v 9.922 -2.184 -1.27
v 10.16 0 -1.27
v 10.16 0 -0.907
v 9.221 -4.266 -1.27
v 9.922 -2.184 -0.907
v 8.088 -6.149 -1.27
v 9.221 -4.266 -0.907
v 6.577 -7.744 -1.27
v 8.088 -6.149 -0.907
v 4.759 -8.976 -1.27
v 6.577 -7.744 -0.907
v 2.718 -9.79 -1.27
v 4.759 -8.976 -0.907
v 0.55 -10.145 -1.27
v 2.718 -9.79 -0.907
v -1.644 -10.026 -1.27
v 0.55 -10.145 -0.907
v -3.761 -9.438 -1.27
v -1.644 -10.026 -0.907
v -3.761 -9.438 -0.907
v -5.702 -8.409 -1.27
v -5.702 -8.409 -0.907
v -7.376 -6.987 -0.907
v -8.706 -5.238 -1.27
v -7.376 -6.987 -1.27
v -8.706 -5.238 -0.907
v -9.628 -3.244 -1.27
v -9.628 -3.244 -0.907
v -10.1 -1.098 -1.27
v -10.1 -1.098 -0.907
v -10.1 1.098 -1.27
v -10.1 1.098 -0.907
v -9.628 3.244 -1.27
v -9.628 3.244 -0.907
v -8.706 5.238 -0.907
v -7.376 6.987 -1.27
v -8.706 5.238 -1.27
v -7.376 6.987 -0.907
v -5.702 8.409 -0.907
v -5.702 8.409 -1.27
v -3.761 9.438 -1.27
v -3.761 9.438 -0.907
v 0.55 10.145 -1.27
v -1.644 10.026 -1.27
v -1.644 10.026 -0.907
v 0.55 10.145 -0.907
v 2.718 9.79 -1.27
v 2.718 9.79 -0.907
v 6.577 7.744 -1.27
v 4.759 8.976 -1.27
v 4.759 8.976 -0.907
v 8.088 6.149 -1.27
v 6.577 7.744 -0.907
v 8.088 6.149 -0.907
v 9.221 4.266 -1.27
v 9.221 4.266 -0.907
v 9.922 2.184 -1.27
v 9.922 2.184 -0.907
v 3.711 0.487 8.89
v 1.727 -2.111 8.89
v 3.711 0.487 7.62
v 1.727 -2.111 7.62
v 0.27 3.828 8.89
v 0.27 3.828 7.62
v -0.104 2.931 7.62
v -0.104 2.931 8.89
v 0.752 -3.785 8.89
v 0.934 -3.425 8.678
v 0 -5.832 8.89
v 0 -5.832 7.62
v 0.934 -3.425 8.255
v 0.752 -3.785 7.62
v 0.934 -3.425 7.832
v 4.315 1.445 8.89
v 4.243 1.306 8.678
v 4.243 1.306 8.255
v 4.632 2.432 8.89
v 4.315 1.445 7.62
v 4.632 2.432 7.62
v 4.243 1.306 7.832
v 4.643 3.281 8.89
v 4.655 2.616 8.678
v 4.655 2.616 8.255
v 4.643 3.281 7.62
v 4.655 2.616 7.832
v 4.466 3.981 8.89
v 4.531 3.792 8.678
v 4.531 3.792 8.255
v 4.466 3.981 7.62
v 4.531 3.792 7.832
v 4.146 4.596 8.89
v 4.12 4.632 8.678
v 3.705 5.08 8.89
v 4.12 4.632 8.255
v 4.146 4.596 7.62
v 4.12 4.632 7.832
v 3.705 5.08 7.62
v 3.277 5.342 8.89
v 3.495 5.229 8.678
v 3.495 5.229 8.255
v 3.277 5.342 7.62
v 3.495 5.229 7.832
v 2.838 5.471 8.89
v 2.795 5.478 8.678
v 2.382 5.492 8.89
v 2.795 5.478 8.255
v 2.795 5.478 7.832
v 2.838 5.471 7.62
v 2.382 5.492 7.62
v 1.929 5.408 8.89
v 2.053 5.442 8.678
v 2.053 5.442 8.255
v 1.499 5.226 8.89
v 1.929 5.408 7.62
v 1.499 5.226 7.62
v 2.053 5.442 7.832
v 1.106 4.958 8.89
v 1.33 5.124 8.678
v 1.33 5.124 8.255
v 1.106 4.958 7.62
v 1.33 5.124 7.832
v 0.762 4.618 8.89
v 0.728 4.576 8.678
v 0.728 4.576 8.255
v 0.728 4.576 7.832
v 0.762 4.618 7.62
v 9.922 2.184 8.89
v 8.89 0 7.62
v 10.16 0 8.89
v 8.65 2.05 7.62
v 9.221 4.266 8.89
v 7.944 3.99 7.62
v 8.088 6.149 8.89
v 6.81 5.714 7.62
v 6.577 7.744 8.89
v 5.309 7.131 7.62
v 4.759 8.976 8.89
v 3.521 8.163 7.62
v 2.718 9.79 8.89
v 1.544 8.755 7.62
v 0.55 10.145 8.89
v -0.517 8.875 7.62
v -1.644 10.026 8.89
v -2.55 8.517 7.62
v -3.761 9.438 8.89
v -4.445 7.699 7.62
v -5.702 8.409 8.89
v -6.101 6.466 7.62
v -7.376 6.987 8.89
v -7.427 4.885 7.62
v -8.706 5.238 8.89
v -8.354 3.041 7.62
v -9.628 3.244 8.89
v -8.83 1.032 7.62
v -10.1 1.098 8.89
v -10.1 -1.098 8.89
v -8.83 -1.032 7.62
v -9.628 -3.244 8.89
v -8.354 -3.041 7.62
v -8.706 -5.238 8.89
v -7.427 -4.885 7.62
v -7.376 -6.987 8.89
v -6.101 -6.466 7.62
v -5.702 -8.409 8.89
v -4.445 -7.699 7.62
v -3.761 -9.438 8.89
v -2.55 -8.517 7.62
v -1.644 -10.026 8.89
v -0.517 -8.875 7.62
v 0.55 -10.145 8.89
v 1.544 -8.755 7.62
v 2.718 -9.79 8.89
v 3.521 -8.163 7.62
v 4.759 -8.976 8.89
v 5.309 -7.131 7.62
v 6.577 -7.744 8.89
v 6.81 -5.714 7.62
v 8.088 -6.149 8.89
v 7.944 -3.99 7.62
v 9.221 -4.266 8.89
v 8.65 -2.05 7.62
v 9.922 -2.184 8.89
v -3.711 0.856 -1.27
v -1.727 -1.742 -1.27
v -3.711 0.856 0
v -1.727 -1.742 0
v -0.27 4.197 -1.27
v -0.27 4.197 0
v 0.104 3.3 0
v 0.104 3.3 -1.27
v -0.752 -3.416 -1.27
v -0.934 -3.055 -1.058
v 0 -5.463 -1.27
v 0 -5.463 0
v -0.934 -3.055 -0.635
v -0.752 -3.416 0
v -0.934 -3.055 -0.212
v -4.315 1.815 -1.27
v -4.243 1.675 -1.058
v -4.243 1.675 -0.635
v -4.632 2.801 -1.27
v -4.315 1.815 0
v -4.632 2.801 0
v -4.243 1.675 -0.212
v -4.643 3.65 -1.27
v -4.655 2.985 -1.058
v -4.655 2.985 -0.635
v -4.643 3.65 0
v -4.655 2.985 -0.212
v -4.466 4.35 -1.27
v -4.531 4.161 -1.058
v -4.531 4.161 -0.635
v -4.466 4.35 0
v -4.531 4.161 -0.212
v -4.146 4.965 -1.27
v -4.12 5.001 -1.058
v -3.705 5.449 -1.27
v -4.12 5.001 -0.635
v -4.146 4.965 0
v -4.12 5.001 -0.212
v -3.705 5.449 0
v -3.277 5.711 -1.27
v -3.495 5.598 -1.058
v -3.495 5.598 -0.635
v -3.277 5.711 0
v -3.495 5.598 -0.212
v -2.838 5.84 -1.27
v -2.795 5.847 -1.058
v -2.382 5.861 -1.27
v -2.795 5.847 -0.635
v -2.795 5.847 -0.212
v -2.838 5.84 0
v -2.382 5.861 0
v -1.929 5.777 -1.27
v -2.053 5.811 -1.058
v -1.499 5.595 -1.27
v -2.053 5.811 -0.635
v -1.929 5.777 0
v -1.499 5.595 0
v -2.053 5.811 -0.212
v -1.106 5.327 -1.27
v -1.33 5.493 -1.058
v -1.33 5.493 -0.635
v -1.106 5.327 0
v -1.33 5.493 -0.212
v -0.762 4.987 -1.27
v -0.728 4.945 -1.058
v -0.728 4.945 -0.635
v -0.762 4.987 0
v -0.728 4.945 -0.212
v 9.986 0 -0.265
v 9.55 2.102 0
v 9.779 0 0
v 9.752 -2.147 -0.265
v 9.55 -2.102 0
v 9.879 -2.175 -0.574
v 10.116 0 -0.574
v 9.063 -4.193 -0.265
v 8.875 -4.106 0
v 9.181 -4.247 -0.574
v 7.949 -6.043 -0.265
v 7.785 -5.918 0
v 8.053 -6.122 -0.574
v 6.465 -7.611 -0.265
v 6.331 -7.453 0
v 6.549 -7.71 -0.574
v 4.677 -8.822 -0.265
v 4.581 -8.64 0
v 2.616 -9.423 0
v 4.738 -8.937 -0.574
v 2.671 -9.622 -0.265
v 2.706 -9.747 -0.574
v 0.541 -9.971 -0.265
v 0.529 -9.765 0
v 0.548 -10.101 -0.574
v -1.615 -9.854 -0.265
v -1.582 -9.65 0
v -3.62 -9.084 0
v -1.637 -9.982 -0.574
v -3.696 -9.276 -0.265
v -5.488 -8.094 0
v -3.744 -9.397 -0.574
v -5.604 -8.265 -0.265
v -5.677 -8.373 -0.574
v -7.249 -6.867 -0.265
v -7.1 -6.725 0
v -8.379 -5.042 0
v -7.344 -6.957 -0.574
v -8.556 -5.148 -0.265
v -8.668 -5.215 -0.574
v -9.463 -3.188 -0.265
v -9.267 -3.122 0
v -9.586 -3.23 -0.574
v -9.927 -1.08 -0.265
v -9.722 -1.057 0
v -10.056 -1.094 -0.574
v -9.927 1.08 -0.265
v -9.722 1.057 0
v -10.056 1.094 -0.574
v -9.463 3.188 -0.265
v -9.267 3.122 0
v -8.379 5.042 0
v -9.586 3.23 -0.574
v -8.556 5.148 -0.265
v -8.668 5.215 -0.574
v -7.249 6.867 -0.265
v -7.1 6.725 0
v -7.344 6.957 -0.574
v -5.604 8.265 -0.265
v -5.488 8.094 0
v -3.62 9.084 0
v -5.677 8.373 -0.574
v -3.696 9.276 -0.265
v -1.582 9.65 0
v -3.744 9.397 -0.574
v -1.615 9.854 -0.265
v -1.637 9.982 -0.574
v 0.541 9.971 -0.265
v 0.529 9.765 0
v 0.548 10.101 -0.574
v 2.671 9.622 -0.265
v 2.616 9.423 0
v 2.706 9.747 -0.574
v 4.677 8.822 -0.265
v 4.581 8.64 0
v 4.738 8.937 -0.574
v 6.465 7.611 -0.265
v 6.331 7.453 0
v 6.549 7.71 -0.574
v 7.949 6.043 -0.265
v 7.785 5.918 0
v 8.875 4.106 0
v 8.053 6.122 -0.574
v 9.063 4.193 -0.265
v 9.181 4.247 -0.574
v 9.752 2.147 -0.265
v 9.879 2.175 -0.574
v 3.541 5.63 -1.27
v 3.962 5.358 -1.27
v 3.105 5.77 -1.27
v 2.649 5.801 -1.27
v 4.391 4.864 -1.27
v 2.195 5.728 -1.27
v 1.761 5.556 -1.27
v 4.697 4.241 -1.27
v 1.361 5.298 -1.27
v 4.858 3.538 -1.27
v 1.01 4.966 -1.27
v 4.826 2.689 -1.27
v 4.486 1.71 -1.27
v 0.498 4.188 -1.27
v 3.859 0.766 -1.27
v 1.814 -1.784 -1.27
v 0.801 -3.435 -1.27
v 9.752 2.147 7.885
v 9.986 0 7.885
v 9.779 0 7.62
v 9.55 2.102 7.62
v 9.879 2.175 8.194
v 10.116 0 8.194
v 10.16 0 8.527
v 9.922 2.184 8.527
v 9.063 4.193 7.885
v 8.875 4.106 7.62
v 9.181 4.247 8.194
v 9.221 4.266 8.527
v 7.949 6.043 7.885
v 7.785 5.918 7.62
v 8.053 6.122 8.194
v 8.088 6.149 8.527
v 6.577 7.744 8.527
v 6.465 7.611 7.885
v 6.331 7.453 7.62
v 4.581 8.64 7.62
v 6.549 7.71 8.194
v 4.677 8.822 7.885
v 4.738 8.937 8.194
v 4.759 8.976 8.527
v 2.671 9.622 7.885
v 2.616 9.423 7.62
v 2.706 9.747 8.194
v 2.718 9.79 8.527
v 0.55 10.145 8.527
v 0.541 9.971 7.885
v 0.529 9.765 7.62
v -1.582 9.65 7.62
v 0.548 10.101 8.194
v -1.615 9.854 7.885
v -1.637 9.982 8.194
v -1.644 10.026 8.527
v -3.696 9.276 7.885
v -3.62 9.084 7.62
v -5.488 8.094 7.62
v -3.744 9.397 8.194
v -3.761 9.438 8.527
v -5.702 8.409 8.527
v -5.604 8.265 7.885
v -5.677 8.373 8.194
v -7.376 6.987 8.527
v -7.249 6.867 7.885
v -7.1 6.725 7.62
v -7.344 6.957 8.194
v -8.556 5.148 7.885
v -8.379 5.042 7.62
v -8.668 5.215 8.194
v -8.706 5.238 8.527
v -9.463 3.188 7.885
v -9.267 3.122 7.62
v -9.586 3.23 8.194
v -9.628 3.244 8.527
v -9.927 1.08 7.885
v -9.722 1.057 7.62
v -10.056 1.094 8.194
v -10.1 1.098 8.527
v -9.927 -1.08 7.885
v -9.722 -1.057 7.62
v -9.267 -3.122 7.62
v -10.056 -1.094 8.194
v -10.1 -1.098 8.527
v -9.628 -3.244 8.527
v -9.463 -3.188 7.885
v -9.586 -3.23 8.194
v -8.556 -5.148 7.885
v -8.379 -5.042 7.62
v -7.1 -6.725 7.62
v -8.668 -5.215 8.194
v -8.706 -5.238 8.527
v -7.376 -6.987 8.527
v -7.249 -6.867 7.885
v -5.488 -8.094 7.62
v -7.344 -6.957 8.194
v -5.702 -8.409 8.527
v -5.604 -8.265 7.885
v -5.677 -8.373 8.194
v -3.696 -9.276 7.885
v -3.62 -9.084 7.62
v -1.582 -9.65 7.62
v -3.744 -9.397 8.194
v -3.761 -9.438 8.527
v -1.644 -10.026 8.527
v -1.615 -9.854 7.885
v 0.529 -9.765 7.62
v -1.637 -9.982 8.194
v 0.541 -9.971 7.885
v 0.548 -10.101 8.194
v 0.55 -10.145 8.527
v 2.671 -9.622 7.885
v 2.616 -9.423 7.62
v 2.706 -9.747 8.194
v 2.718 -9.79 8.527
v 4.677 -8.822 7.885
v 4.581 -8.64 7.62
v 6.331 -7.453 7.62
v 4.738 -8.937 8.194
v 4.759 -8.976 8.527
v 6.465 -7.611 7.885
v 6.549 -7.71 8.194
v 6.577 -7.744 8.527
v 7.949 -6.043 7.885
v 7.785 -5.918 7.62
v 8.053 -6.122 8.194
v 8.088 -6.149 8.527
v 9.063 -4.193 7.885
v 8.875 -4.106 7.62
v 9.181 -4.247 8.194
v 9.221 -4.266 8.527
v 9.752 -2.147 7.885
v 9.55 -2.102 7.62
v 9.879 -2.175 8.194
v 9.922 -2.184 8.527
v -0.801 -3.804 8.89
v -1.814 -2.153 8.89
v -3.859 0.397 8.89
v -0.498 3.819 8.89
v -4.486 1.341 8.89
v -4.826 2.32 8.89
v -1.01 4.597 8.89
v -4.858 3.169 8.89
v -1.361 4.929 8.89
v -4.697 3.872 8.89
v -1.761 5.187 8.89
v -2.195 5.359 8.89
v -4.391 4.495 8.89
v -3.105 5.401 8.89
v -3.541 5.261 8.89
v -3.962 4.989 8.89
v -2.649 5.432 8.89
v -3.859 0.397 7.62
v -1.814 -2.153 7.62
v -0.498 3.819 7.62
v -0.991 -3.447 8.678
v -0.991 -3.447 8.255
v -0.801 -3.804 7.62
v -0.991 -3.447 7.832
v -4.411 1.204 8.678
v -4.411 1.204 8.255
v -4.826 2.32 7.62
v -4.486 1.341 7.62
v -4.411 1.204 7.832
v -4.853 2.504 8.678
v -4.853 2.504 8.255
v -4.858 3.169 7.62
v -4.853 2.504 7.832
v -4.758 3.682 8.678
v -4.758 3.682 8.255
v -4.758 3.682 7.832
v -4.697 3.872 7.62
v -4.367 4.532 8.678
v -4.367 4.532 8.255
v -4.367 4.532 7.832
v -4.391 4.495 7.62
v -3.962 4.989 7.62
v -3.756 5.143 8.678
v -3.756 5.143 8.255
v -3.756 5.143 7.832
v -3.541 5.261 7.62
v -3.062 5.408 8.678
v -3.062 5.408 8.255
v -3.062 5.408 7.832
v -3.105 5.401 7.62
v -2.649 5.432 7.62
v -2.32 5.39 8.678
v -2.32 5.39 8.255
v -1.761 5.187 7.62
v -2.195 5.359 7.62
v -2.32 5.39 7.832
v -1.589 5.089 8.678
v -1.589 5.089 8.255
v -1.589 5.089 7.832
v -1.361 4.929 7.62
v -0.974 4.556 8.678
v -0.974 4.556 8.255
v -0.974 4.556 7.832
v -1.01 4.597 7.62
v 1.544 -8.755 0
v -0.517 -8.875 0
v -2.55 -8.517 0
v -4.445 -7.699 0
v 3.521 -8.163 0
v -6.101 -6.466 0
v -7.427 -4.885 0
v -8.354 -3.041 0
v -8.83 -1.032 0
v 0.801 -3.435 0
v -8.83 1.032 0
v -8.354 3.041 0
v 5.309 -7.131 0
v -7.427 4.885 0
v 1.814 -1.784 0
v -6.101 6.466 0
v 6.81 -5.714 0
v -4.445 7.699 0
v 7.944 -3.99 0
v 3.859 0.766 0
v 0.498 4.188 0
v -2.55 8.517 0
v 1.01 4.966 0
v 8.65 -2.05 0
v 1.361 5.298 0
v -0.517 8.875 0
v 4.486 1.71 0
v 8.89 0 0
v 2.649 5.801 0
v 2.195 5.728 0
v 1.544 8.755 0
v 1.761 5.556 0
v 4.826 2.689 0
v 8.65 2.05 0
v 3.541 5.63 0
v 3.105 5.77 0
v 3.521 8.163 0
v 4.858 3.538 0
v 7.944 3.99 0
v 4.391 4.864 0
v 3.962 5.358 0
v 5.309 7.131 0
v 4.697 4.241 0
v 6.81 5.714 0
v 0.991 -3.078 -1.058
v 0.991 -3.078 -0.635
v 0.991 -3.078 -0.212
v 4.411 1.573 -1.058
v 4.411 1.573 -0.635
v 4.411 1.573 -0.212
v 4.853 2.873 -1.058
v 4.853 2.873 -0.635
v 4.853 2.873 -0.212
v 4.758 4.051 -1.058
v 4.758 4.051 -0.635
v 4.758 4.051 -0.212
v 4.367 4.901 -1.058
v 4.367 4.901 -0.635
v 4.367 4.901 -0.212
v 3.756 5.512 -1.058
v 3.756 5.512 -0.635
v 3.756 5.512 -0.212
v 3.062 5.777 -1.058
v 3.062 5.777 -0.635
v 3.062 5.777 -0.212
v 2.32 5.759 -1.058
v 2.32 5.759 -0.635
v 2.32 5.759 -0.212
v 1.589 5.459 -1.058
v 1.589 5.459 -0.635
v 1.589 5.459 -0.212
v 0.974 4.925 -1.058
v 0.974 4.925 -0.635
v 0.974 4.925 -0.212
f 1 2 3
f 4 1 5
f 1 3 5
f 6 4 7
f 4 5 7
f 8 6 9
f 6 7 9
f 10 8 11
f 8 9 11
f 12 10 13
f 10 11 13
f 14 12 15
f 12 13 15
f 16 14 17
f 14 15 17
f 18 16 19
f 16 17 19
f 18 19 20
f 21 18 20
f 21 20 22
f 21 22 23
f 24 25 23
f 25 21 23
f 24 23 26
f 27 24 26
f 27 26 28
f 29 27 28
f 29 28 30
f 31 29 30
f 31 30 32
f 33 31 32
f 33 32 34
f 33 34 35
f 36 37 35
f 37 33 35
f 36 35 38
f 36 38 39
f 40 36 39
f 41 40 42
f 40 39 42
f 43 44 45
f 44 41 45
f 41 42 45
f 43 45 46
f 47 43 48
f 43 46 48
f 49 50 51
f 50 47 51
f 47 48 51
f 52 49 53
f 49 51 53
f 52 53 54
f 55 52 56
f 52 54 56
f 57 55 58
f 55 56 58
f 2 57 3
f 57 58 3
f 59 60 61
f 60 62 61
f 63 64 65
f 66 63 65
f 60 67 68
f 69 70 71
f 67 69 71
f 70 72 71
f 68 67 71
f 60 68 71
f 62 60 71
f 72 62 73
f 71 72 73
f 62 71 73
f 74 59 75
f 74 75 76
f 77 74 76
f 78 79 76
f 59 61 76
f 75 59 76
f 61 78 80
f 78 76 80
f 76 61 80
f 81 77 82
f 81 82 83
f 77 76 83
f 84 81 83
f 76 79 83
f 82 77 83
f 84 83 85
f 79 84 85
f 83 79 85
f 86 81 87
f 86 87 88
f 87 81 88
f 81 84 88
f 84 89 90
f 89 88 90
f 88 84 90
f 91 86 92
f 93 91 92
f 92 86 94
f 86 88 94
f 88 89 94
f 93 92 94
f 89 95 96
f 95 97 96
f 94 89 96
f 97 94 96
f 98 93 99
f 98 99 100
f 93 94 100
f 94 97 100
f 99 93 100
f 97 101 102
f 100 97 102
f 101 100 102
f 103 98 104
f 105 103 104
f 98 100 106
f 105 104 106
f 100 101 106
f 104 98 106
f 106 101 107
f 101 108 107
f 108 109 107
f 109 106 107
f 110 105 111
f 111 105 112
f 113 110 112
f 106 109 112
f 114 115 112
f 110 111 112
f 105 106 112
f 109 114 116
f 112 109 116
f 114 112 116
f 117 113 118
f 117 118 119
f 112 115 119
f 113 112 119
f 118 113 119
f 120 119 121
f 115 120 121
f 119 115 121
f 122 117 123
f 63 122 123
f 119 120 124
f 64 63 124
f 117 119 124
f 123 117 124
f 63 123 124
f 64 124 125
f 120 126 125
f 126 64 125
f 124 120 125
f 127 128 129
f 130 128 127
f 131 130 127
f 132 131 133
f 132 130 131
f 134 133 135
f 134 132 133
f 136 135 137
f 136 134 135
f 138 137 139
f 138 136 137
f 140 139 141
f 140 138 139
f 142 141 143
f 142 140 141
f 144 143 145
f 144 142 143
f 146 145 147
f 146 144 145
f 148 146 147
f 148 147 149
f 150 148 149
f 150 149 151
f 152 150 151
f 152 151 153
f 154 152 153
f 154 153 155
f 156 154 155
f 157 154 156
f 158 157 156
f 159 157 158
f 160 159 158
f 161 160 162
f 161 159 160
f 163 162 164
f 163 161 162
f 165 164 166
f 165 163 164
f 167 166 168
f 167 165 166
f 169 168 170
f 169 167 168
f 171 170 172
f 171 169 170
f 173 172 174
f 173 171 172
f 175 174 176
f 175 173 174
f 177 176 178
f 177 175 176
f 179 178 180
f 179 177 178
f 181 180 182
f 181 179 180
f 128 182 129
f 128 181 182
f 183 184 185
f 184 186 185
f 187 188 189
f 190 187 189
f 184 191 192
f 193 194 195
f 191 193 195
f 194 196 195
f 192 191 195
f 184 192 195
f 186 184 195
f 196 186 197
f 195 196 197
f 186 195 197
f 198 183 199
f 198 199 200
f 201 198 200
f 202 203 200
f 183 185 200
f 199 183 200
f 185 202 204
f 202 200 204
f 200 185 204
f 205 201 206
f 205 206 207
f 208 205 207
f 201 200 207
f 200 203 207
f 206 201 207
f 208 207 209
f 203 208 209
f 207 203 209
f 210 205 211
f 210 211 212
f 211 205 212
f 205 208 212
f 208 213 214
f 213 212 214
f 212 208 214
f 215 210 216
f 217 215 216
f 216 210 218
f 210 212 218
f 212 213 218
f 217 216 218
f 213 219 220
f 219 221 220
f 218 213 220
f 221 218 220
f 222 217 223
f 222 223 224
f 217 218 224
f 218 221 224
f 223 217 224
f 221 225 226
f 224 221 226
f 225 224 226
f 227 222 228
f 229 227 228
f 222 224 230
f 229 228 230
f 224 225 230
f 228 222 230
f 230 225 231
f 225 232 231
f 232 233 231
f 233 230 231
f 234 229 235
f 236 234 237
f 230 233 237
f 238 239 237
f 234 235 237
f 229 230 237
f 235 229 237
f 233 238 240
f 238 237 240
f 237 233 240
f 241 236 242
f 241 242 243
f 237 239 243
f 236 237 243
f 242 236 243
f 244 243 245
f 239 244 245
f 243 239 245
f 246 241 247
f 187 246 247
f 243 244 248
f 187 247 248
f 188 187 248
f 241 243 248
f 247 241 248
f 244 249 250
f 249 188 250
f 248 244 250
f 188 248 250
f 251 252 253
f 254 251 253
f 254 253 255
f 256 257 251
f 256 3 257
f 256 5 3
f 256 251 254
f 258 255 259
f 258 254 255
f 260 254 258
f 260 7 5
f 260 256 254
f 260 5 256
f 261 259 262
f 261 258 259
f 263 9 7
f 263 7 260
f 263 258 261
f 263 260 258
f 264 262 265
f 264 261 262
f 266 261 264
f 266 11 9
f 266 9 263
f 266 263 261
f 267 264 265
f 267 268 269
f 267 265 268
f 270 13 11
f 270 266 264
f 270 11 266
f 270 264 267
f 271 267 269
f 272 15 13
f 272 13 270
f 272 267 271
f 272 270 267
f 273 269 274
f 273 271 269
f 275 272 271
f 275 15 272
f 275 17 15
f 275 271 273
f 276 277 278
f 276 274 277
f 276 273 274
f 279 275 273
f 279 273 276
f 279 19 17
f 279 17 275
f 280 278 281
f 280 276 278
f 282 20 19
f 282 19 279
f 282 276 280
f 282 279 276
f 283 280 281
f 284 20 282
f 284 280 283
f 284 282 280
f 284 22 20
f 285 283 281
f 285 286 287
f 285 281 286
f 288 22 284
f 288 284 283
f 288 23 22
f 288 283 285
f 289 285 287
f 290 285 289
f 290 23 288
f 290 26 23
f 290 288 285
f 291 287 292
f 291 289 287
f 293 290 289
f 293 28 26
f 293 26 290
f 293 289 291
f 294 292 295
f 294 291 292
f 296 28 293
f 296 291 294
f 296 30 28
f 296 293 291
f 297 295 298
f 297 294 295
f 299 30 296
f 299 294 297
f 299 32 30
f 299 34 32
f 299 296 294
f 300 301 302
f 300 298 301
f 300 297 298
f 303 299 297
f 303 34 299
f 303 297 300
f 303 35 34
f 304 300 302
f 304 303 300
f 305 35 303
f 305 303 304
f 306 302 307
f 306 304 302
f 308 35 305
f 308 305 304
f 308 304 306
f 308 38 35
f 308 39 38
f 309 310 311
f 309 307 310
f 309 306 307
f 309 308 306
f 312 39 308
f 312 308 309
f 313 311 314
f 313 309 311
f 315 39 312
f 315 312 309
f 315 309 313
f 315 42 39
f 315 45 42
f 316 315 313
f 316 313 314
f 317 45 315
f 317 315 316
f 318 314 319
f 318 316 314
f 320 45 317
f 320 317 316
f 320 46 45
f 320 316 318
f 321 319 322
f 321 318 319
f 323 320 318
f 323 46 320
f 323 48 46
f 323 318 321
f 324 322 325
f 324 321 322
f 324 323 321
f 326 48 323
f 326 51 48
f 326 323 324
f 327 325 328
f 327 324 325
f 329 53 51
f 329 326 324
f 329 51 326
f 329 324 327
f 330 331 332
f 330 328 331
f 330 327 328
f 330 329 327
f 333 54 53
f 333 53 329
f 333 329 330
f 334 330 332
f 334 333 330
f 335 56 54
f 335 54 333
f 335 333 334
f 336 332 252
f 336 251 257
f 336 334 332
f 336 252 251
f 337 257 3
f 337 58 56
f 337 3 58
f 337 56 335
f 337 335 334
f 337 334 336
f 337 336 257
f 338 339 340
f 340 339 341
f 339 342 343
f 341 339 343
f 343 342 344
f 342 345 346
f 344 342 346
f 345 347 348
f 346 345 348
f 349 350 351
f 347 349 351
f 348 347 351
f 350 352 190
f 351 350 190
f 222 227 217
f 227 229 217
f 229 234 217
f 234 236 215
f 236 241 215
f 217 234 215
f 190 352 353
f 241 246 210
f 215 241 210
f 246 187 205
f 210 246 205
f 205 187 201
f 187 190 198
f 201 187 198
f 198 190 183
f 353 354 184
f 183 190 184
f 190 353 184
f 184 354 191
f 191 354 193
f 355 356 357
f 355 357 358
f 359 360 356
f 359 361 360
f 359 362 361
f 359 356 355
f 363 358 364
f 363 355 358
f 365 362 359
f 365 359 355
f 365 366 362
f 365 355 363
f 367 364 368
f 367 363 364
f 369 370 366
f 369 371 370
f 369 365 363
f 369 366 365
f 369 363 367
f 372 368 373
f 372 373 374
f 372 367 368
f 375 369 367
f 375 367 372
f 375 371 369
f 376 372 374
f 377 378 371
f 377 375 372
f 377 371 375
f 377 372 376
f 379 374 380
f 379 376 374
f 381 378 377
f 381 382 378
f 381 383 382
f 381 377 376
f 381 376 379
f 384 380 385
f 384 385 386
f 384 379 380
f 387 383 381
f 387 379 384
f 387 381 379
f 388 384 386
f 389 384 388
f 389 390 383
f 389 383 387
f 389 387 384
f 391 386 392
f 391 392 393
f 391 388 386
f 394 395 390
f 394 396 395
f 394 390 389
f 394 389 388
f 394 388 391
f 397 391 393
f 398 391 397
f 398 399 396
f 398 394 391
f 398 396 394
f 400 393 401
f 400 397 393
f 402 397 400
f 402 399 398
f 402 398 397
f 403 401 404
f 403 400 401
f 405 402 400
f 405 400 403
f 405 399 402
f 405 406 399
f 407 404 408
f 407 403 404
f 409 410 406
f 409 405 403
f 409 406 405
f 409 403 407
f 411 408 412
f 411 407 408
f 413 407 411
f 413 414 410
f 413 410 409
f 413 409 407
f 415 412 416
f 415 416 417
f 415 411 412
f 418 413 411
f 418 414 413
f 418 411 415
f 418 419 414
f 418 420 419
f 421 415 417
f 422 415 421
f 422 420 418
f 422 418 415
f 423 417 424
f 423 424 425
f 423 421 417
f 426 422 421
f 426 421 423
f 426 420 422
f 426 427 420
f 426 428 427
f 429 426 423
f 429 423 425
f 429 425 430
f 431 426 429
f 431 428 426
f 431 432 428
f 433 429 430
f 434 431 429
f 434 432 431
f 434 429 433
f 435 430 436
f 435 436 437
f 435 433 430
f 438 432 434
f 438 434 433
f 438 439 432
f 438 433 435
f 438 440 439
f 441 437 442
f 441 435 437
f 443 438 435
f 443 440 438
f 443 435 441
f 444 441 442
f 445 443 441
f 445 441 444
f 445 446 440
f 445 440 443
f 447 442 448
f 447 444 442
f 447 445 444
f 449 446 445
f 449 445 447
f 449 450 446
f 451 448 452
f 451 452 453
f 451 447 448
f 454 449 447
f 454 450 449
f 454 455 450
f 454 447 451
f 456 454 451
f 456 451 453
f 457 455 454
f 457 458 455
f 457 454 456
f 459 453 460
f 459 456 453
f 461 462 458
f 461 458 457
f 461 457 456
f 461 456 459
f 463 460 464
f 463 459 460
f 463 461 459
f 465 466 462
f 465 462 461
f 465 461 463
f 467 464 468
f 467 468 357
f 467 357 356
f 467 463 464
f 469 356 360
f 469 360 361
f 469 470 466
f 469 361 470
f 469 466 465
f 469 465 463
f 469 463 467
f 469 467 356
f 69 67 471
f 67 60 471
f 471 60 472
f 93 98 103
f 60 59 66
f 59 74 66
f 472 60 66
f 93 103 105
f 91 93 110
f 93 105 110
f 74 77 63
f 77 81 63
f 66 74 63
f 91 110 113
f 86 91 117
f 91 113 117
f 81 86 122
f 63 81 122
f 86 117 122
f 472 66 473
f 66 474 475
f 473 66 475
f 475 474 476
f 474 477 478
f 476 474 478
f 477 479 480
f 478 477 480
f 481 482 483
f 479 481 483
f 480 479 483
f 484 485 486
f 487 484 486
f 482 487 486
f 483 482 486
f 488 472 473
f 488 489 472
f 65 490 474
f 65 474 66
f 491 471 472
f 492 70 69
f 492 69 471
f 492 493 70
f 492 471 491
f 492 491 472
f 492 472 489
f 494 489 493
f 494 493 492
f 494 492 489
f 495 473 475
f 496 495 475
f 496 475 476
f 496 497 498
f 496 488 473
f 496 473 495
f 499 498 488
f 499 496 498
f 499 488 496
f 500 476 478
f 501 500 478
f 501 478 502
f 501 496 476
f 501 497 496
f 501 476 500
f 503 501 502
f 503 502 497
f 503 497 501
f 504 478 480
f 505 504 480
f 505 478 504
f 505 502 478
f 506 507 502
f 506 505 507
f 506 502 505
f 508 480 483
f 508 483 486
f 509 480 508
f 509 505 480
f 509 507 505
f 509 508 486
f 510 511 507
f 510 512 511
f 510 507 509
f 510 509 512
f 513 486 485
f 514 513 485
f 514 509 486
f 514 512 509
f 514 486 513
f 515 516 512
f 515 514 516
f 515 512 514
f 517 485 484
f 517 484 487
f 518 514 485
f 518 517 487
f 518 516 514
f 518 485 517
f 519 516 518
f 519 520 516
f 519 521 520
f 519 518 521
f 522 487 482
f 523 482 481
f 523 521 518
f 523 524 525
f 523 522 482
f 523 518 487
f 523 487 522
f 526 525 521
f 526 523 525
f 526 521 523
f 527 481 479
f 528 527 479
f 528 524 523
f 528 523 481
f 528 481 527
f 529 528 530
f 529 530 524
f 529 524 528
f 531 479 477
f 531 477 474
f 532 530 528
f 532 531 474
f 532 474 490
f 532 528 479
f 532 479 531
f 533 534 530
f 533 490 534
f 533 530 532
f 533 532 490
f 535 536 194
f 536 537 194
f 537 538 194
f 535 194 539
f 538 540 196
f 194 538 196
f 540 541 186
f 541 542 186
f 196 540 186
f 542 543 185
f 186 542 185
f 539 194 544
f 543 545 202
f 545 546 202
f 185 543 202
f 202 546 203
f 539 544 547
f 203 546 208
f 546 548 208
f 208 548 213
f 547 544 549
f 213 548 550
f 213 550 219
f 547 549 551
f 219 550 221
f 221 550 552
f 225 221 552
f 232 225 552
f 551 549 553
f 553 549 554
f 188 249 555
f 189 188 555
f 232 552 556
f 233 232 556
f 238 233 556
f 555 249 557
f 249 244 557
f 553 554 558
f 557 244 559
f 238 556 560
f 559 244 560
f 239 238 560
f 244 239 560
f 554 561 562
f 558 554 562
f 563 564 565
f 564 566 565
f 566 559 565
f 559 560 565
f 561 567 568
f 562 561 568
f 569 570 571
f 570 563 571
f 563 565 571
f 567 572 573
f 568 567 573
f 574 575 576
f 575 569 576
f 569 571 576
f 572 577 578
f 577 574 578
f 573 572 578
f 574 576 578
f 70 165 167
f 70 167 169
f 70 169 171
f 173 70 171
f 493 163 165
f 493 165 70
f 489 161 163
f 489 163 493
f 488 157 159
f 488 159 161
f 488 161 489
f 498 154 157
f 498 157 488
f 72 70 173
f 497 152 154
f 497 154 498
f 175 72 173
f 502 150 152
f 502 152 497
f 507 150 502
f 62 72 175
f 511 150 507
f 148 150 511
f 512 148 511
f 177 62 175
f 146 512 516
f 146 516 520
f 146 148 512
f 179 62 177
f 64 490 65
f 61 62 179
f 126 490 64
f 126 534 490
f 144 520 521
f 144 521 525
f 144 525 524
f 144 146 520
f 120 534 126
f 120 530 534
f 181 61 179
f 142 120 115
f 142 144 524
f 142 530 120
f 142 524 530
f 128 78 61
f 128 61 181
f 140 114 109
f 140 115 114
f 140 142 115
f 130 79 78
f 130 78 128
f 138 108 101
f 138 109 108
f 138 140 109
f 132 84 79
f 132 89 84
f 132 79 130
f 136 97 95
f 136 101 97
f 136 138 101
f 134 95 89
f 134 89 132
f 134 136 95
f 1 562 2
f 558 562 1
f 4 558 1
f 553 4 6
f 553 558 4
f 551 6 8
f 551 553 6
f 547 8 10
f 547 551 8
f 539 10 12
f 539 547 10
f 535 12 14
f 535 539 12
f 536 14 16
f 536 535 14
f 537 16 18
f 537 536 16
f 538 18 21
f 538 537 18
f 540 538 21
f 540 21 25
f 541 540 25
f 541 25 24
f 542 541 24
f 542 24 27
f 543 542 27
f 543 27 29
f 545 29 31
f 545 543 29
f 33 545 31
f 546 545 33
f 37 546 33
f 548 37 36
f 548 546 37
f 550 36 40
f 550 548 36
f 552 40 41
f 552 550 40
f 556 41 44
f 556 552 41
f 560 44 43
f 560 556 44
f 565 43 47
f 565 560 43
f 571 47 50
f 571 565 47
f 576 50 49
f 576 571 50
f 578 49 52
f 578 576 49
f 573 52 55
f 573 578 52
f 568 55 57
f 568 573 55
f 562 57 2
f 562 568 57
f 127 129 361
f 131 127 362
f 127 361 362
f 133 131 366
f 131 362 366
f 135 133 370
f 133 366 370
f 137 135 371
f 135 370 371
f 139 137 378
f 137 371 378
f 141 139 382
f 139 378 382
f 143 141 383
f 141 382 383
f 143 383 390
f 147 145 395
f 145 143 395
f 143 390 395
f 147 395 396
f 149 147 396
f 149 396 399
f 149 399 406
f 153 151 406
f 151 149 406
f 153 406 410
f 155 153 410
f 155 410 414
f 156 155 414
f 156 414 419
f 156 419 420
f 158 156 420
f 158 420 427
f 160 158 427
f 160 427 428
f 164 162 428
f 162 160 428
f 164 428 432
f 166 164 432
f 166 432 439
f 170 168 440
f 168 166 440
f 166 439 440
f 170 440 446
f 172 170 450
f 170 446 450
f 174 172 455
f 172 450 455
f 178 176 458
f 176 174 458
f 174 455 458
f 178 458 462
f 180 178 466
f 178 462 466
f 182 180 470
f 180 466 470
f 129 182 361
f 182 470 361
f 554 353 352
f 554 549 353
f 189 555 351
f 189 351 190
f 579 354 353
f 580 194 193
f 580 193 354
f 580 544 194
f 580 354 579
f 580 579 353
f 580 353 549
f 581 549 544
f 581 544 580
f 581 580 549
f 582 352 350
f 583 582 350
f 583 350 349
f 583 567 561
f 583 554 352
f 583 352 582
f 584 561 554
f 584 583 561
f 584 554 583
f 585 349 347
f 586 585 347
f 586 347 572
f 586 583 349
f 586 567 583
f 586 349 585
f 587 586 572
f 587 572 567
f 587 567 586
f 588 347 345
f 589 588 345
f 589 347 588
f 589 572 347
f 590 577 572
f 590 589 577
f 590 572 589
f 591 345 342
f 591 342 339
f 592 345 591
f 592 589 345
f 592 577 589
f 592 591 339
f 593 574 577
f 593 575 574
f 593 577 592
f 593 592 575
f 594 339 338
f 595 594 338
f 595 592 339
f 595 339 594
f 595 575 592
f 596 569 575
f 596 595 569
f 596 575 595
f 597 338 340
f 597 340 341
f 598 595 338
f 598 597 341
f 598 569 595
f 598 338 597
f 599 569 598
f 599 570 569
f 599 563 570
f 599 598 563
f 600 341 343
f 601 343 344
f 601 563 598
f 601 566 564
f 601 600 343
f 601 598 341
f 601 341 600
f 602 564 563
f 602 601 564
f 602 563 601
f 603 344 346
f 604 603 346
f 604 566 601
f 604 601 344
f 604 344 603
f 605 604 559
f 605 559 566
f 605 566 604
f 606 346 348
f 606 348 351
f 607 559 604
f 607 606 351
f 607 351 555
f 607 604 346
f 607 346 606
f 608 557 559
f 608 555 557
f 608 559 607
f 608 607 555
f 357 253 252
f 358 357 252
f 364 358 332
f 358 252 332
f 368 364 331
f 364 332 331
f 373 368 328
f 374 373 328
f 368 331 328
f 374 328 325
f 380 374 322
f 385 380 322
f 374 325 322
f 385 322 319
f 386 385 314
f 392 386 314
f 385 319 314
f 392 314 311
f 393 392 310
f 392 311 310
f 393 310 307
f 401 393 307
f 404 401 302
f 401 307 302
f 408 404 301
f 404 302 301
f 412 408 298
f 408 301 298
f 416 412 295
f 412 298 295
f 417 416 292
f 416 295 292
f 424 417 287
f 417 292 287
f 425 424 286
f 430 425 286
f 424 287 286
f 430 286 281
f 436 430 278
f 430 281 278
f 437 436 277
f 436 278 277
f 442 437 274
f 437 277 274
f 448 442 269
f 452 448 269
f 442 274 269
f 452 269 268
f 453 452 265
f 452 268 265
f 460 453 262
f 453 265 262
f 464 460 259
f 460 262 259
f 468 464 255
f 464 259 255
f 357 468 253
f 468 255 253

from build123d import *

# Parameters (mm, degrees)
F0_R      = 9.779
F1_DEPTH  = 7.62
F2_R      = 10.16
F2_R_2    = 8.89
F3_DEPTH  = 2.54
F5_R      = 10.16
F5_R_2    = 8.89
F6_DEPTH  = 2.54
F9_DEPTH  = 1.27
F11_DEPTH = 1.27


# Not quite as in the source:
# - a fillet or chamfer that OpenCascade refuses, or shapes differently, is made with other operations: its cross-section is extruded or revolved along the edge and cut away or added


with BuildPart() as f1:
    # F0 (on Top) → F1 (new body)
    with BuildSketch(Plane.XY):
        Circle(F0_R)
    extrude(amount=F1_DEPTH)

    # F2 (on face) → F3 (join)
    with BuildSketch(Plane.XY.offset(7.62)):
        Circle(F2_R)
        Circle(F2_R_2, mode=Mode.SUBTRACT)
    extrude(amount=F3_DEPTH)

    # F4: chamfer of 2.54 on 1 edges, made by hand


with BuildPart() as f4_tool2:
    # F4_s3 → F4_t4 (revolve)
    with BuildSketch(Plane.XZ):
        Polygon((11.43, 10.16), (8.89, 7.62), (8.89, 10.16), align=None)
    revolve(axis=Axis((0, 0, 10.16), (0, 0, 1)))

    split(bisect_by=Plane.XY.offset(7.62), keep=Keep.TOP)


with BuildPart() as f1_1:
    add(f1.part)

    # F4_t1: cut F4_tool2
    add(f4_tool2.part, mode=Mode.SUBTRACT)

    # F5 (on face) → F6 (join)
    with BuildSketch(Plane(origin=(0, 0, 0), x_dir=(1, 0, 0), z_dir=(0, 0, -1))):
        Circle(F5_R)
        Circle(F5_R_2, mode=Mode.SUBTRACT)
    extrude(amount=F6_DEPTH)

    # F7: chamfer of 2.54 on 1 edges, made by hand


with BuildPart() as f7_tool2:
    # F7_s3 → F7_t4 (revolve)
    with BuildSketch(Plane.XZ):
        Polygon((11.43, -2.54), (8.89, 0), (8.89, -2.54), align=None)
    revolve(axis=Axis((0, 0, -2.54), (0, 0, -1)))

    split(bisect_by=Plane.XY, keep=Keep.BOTTOM)


with BuildPart() as f1_2:
    add(f1_1.part)

    # F7_t1: cut F7_tool2
    add(f7_tool2.part, mode=Mode.SUBTRACT)

    # F8 (on face) → F9 (join)
    with BuildSketch(Plane.XY.offset(7.62)):
        with BuildLine():
            add(Edge.make_bspline(
                [(0, -5.8319969103), (-1.0236980804, -2.2401487669), (-4.8354001596, 0.5610413637), (-5.0054154902, 3.6583937204), (-3.9025040717, 5.331842318), (-2.2678517349, 5.574651604), (-0.814518434, 4.6455144306), (-0.3463686184, 3.5171935493), (-0.1037365128, 2.9312386094)],
                knots=[0, 0, 0, 0, 0.2996260724, 0.4641202227, 0.6025141594, 0.7280159913, 0.8588502662, 1, 1, 1, 1], degree=3))
            Line((0, -5.8319969103), (-0.1037365128, 2.9312386094))
        make_face()
        with BuildLine():
            Line((-0.1037365128, 2.9312386094), (0, -5.8319969103))
            add(Edge.make_bspline(
                [(0, -5.8319969103), (0.9383847232, -2.2169222283), (4.6827086977, 0.6737138371), (4.7793556331, 3.7742228605), (3.6371392772, 5.4210943193), (1.997197208, 5.6251399542), (0.5662657677, 4.6618597334), (0.1249568333, 3.5227729564), (-0.1037365128, 2.9312386094)],
                knots=[0, 0, 0, 0, 0.2996260724, 0.4641202227, 0.6025141594, 0.7280159913, 0.8588502662, 1, 1, 1, 1], degree=3))
        make_face()
    extrude(amount=F9_DEPTH)

    # F10 (on face) → F11 (join)
    with BuildSketch(Plane(origin=(0, 0, 0), x_dir=(1, 0, 0), z_dir=(0, 0, -1))):
        with BuildLine():
            add(Edge.make_bspline(
                [(0, 5.462912377), (1.0236980804, 1.8710642336), (4.8354001596, -0.930125897), (5.0054154902, -4.0274782537), (3.9025040717, -5.7009268513), (2.2678517349, -5.9437361373), (0.814518434, -5.0145989639), (0.3463686184, -3.8862780826), (0.1037365128, -3.3003231427)],
                knots=[0, 0, 0, 0, 0.2996260724, 0.4641202227, 0.6025141594, 0.7280159913, 0.8588502662, 1, 1, 1, 1], degree=3))
            Line((0, 5.462912377), (0.1037365128, -3.3003231427))
        make_face()
        with BuildLine():
            Line((0.1037365128, -3.3003231427), (0, 5.462912377))
            add(Edge.make_bspline(
                [(0, 5.462912377), (-0.9383847232, 1.847837695), (-4.6827086977, -1.0427983704), (-4.7793556331, -4.1433073938), (-3.6371392772, -5.7901788526), (-1.997197208, -5.9942244875), (-0.5662657677, -5.0309442667), (-0.1249568333, -3.8918574898), (0.1037365128, -3.3003231427)],
                knots=[0, 0, 0, 0, 0.2996260724, 0.4641202227, 0.6025141594, 0.7280159913, 0.8588502662, 1, 1, 1, 1], degree=3))
        make_face()
    extrude(amount=F11_DEPTH)

    # F12: fillet of radius 1.27 on 2 edges, made by hand

    # F12_s1 → F12_t2 (revolve, cut)
    with BuildSketch(Plane.XZ):
        with BuildLine():
            ThreePointArc((9.779, 0), (10.0608821461, -0.4150925255), (10.16, -0.9069614104))
            Line((10.16, -0.9069614104), (10.16, 0))
            Line((10.16, 0), (9.779, 0))
        make_face()
    revolve(axis=Axis((0, 0, 0), (0, 0, -1)), mode=Mode.SUBTRACT)

    # F12_s3 → F12_t4 (revolve, cut)
    with BuildSketch(Plane.XZ):
        with BuildLine():
            ThreePointArc((9.779, 7.62), (10.0608821461, 8.0350925255), (10.16, 8.5269614104))
            Line((10.16, 8.5269614104), (10.16, 7.62))
            Line((10.16, 7.62), (9.779, 7.62))
        make_face()
    revolve(axis=Axis((0, 0, 7.62), (0, 0, 1)), mode=Mode.SUBTRACT)


solid = f1_2.part
